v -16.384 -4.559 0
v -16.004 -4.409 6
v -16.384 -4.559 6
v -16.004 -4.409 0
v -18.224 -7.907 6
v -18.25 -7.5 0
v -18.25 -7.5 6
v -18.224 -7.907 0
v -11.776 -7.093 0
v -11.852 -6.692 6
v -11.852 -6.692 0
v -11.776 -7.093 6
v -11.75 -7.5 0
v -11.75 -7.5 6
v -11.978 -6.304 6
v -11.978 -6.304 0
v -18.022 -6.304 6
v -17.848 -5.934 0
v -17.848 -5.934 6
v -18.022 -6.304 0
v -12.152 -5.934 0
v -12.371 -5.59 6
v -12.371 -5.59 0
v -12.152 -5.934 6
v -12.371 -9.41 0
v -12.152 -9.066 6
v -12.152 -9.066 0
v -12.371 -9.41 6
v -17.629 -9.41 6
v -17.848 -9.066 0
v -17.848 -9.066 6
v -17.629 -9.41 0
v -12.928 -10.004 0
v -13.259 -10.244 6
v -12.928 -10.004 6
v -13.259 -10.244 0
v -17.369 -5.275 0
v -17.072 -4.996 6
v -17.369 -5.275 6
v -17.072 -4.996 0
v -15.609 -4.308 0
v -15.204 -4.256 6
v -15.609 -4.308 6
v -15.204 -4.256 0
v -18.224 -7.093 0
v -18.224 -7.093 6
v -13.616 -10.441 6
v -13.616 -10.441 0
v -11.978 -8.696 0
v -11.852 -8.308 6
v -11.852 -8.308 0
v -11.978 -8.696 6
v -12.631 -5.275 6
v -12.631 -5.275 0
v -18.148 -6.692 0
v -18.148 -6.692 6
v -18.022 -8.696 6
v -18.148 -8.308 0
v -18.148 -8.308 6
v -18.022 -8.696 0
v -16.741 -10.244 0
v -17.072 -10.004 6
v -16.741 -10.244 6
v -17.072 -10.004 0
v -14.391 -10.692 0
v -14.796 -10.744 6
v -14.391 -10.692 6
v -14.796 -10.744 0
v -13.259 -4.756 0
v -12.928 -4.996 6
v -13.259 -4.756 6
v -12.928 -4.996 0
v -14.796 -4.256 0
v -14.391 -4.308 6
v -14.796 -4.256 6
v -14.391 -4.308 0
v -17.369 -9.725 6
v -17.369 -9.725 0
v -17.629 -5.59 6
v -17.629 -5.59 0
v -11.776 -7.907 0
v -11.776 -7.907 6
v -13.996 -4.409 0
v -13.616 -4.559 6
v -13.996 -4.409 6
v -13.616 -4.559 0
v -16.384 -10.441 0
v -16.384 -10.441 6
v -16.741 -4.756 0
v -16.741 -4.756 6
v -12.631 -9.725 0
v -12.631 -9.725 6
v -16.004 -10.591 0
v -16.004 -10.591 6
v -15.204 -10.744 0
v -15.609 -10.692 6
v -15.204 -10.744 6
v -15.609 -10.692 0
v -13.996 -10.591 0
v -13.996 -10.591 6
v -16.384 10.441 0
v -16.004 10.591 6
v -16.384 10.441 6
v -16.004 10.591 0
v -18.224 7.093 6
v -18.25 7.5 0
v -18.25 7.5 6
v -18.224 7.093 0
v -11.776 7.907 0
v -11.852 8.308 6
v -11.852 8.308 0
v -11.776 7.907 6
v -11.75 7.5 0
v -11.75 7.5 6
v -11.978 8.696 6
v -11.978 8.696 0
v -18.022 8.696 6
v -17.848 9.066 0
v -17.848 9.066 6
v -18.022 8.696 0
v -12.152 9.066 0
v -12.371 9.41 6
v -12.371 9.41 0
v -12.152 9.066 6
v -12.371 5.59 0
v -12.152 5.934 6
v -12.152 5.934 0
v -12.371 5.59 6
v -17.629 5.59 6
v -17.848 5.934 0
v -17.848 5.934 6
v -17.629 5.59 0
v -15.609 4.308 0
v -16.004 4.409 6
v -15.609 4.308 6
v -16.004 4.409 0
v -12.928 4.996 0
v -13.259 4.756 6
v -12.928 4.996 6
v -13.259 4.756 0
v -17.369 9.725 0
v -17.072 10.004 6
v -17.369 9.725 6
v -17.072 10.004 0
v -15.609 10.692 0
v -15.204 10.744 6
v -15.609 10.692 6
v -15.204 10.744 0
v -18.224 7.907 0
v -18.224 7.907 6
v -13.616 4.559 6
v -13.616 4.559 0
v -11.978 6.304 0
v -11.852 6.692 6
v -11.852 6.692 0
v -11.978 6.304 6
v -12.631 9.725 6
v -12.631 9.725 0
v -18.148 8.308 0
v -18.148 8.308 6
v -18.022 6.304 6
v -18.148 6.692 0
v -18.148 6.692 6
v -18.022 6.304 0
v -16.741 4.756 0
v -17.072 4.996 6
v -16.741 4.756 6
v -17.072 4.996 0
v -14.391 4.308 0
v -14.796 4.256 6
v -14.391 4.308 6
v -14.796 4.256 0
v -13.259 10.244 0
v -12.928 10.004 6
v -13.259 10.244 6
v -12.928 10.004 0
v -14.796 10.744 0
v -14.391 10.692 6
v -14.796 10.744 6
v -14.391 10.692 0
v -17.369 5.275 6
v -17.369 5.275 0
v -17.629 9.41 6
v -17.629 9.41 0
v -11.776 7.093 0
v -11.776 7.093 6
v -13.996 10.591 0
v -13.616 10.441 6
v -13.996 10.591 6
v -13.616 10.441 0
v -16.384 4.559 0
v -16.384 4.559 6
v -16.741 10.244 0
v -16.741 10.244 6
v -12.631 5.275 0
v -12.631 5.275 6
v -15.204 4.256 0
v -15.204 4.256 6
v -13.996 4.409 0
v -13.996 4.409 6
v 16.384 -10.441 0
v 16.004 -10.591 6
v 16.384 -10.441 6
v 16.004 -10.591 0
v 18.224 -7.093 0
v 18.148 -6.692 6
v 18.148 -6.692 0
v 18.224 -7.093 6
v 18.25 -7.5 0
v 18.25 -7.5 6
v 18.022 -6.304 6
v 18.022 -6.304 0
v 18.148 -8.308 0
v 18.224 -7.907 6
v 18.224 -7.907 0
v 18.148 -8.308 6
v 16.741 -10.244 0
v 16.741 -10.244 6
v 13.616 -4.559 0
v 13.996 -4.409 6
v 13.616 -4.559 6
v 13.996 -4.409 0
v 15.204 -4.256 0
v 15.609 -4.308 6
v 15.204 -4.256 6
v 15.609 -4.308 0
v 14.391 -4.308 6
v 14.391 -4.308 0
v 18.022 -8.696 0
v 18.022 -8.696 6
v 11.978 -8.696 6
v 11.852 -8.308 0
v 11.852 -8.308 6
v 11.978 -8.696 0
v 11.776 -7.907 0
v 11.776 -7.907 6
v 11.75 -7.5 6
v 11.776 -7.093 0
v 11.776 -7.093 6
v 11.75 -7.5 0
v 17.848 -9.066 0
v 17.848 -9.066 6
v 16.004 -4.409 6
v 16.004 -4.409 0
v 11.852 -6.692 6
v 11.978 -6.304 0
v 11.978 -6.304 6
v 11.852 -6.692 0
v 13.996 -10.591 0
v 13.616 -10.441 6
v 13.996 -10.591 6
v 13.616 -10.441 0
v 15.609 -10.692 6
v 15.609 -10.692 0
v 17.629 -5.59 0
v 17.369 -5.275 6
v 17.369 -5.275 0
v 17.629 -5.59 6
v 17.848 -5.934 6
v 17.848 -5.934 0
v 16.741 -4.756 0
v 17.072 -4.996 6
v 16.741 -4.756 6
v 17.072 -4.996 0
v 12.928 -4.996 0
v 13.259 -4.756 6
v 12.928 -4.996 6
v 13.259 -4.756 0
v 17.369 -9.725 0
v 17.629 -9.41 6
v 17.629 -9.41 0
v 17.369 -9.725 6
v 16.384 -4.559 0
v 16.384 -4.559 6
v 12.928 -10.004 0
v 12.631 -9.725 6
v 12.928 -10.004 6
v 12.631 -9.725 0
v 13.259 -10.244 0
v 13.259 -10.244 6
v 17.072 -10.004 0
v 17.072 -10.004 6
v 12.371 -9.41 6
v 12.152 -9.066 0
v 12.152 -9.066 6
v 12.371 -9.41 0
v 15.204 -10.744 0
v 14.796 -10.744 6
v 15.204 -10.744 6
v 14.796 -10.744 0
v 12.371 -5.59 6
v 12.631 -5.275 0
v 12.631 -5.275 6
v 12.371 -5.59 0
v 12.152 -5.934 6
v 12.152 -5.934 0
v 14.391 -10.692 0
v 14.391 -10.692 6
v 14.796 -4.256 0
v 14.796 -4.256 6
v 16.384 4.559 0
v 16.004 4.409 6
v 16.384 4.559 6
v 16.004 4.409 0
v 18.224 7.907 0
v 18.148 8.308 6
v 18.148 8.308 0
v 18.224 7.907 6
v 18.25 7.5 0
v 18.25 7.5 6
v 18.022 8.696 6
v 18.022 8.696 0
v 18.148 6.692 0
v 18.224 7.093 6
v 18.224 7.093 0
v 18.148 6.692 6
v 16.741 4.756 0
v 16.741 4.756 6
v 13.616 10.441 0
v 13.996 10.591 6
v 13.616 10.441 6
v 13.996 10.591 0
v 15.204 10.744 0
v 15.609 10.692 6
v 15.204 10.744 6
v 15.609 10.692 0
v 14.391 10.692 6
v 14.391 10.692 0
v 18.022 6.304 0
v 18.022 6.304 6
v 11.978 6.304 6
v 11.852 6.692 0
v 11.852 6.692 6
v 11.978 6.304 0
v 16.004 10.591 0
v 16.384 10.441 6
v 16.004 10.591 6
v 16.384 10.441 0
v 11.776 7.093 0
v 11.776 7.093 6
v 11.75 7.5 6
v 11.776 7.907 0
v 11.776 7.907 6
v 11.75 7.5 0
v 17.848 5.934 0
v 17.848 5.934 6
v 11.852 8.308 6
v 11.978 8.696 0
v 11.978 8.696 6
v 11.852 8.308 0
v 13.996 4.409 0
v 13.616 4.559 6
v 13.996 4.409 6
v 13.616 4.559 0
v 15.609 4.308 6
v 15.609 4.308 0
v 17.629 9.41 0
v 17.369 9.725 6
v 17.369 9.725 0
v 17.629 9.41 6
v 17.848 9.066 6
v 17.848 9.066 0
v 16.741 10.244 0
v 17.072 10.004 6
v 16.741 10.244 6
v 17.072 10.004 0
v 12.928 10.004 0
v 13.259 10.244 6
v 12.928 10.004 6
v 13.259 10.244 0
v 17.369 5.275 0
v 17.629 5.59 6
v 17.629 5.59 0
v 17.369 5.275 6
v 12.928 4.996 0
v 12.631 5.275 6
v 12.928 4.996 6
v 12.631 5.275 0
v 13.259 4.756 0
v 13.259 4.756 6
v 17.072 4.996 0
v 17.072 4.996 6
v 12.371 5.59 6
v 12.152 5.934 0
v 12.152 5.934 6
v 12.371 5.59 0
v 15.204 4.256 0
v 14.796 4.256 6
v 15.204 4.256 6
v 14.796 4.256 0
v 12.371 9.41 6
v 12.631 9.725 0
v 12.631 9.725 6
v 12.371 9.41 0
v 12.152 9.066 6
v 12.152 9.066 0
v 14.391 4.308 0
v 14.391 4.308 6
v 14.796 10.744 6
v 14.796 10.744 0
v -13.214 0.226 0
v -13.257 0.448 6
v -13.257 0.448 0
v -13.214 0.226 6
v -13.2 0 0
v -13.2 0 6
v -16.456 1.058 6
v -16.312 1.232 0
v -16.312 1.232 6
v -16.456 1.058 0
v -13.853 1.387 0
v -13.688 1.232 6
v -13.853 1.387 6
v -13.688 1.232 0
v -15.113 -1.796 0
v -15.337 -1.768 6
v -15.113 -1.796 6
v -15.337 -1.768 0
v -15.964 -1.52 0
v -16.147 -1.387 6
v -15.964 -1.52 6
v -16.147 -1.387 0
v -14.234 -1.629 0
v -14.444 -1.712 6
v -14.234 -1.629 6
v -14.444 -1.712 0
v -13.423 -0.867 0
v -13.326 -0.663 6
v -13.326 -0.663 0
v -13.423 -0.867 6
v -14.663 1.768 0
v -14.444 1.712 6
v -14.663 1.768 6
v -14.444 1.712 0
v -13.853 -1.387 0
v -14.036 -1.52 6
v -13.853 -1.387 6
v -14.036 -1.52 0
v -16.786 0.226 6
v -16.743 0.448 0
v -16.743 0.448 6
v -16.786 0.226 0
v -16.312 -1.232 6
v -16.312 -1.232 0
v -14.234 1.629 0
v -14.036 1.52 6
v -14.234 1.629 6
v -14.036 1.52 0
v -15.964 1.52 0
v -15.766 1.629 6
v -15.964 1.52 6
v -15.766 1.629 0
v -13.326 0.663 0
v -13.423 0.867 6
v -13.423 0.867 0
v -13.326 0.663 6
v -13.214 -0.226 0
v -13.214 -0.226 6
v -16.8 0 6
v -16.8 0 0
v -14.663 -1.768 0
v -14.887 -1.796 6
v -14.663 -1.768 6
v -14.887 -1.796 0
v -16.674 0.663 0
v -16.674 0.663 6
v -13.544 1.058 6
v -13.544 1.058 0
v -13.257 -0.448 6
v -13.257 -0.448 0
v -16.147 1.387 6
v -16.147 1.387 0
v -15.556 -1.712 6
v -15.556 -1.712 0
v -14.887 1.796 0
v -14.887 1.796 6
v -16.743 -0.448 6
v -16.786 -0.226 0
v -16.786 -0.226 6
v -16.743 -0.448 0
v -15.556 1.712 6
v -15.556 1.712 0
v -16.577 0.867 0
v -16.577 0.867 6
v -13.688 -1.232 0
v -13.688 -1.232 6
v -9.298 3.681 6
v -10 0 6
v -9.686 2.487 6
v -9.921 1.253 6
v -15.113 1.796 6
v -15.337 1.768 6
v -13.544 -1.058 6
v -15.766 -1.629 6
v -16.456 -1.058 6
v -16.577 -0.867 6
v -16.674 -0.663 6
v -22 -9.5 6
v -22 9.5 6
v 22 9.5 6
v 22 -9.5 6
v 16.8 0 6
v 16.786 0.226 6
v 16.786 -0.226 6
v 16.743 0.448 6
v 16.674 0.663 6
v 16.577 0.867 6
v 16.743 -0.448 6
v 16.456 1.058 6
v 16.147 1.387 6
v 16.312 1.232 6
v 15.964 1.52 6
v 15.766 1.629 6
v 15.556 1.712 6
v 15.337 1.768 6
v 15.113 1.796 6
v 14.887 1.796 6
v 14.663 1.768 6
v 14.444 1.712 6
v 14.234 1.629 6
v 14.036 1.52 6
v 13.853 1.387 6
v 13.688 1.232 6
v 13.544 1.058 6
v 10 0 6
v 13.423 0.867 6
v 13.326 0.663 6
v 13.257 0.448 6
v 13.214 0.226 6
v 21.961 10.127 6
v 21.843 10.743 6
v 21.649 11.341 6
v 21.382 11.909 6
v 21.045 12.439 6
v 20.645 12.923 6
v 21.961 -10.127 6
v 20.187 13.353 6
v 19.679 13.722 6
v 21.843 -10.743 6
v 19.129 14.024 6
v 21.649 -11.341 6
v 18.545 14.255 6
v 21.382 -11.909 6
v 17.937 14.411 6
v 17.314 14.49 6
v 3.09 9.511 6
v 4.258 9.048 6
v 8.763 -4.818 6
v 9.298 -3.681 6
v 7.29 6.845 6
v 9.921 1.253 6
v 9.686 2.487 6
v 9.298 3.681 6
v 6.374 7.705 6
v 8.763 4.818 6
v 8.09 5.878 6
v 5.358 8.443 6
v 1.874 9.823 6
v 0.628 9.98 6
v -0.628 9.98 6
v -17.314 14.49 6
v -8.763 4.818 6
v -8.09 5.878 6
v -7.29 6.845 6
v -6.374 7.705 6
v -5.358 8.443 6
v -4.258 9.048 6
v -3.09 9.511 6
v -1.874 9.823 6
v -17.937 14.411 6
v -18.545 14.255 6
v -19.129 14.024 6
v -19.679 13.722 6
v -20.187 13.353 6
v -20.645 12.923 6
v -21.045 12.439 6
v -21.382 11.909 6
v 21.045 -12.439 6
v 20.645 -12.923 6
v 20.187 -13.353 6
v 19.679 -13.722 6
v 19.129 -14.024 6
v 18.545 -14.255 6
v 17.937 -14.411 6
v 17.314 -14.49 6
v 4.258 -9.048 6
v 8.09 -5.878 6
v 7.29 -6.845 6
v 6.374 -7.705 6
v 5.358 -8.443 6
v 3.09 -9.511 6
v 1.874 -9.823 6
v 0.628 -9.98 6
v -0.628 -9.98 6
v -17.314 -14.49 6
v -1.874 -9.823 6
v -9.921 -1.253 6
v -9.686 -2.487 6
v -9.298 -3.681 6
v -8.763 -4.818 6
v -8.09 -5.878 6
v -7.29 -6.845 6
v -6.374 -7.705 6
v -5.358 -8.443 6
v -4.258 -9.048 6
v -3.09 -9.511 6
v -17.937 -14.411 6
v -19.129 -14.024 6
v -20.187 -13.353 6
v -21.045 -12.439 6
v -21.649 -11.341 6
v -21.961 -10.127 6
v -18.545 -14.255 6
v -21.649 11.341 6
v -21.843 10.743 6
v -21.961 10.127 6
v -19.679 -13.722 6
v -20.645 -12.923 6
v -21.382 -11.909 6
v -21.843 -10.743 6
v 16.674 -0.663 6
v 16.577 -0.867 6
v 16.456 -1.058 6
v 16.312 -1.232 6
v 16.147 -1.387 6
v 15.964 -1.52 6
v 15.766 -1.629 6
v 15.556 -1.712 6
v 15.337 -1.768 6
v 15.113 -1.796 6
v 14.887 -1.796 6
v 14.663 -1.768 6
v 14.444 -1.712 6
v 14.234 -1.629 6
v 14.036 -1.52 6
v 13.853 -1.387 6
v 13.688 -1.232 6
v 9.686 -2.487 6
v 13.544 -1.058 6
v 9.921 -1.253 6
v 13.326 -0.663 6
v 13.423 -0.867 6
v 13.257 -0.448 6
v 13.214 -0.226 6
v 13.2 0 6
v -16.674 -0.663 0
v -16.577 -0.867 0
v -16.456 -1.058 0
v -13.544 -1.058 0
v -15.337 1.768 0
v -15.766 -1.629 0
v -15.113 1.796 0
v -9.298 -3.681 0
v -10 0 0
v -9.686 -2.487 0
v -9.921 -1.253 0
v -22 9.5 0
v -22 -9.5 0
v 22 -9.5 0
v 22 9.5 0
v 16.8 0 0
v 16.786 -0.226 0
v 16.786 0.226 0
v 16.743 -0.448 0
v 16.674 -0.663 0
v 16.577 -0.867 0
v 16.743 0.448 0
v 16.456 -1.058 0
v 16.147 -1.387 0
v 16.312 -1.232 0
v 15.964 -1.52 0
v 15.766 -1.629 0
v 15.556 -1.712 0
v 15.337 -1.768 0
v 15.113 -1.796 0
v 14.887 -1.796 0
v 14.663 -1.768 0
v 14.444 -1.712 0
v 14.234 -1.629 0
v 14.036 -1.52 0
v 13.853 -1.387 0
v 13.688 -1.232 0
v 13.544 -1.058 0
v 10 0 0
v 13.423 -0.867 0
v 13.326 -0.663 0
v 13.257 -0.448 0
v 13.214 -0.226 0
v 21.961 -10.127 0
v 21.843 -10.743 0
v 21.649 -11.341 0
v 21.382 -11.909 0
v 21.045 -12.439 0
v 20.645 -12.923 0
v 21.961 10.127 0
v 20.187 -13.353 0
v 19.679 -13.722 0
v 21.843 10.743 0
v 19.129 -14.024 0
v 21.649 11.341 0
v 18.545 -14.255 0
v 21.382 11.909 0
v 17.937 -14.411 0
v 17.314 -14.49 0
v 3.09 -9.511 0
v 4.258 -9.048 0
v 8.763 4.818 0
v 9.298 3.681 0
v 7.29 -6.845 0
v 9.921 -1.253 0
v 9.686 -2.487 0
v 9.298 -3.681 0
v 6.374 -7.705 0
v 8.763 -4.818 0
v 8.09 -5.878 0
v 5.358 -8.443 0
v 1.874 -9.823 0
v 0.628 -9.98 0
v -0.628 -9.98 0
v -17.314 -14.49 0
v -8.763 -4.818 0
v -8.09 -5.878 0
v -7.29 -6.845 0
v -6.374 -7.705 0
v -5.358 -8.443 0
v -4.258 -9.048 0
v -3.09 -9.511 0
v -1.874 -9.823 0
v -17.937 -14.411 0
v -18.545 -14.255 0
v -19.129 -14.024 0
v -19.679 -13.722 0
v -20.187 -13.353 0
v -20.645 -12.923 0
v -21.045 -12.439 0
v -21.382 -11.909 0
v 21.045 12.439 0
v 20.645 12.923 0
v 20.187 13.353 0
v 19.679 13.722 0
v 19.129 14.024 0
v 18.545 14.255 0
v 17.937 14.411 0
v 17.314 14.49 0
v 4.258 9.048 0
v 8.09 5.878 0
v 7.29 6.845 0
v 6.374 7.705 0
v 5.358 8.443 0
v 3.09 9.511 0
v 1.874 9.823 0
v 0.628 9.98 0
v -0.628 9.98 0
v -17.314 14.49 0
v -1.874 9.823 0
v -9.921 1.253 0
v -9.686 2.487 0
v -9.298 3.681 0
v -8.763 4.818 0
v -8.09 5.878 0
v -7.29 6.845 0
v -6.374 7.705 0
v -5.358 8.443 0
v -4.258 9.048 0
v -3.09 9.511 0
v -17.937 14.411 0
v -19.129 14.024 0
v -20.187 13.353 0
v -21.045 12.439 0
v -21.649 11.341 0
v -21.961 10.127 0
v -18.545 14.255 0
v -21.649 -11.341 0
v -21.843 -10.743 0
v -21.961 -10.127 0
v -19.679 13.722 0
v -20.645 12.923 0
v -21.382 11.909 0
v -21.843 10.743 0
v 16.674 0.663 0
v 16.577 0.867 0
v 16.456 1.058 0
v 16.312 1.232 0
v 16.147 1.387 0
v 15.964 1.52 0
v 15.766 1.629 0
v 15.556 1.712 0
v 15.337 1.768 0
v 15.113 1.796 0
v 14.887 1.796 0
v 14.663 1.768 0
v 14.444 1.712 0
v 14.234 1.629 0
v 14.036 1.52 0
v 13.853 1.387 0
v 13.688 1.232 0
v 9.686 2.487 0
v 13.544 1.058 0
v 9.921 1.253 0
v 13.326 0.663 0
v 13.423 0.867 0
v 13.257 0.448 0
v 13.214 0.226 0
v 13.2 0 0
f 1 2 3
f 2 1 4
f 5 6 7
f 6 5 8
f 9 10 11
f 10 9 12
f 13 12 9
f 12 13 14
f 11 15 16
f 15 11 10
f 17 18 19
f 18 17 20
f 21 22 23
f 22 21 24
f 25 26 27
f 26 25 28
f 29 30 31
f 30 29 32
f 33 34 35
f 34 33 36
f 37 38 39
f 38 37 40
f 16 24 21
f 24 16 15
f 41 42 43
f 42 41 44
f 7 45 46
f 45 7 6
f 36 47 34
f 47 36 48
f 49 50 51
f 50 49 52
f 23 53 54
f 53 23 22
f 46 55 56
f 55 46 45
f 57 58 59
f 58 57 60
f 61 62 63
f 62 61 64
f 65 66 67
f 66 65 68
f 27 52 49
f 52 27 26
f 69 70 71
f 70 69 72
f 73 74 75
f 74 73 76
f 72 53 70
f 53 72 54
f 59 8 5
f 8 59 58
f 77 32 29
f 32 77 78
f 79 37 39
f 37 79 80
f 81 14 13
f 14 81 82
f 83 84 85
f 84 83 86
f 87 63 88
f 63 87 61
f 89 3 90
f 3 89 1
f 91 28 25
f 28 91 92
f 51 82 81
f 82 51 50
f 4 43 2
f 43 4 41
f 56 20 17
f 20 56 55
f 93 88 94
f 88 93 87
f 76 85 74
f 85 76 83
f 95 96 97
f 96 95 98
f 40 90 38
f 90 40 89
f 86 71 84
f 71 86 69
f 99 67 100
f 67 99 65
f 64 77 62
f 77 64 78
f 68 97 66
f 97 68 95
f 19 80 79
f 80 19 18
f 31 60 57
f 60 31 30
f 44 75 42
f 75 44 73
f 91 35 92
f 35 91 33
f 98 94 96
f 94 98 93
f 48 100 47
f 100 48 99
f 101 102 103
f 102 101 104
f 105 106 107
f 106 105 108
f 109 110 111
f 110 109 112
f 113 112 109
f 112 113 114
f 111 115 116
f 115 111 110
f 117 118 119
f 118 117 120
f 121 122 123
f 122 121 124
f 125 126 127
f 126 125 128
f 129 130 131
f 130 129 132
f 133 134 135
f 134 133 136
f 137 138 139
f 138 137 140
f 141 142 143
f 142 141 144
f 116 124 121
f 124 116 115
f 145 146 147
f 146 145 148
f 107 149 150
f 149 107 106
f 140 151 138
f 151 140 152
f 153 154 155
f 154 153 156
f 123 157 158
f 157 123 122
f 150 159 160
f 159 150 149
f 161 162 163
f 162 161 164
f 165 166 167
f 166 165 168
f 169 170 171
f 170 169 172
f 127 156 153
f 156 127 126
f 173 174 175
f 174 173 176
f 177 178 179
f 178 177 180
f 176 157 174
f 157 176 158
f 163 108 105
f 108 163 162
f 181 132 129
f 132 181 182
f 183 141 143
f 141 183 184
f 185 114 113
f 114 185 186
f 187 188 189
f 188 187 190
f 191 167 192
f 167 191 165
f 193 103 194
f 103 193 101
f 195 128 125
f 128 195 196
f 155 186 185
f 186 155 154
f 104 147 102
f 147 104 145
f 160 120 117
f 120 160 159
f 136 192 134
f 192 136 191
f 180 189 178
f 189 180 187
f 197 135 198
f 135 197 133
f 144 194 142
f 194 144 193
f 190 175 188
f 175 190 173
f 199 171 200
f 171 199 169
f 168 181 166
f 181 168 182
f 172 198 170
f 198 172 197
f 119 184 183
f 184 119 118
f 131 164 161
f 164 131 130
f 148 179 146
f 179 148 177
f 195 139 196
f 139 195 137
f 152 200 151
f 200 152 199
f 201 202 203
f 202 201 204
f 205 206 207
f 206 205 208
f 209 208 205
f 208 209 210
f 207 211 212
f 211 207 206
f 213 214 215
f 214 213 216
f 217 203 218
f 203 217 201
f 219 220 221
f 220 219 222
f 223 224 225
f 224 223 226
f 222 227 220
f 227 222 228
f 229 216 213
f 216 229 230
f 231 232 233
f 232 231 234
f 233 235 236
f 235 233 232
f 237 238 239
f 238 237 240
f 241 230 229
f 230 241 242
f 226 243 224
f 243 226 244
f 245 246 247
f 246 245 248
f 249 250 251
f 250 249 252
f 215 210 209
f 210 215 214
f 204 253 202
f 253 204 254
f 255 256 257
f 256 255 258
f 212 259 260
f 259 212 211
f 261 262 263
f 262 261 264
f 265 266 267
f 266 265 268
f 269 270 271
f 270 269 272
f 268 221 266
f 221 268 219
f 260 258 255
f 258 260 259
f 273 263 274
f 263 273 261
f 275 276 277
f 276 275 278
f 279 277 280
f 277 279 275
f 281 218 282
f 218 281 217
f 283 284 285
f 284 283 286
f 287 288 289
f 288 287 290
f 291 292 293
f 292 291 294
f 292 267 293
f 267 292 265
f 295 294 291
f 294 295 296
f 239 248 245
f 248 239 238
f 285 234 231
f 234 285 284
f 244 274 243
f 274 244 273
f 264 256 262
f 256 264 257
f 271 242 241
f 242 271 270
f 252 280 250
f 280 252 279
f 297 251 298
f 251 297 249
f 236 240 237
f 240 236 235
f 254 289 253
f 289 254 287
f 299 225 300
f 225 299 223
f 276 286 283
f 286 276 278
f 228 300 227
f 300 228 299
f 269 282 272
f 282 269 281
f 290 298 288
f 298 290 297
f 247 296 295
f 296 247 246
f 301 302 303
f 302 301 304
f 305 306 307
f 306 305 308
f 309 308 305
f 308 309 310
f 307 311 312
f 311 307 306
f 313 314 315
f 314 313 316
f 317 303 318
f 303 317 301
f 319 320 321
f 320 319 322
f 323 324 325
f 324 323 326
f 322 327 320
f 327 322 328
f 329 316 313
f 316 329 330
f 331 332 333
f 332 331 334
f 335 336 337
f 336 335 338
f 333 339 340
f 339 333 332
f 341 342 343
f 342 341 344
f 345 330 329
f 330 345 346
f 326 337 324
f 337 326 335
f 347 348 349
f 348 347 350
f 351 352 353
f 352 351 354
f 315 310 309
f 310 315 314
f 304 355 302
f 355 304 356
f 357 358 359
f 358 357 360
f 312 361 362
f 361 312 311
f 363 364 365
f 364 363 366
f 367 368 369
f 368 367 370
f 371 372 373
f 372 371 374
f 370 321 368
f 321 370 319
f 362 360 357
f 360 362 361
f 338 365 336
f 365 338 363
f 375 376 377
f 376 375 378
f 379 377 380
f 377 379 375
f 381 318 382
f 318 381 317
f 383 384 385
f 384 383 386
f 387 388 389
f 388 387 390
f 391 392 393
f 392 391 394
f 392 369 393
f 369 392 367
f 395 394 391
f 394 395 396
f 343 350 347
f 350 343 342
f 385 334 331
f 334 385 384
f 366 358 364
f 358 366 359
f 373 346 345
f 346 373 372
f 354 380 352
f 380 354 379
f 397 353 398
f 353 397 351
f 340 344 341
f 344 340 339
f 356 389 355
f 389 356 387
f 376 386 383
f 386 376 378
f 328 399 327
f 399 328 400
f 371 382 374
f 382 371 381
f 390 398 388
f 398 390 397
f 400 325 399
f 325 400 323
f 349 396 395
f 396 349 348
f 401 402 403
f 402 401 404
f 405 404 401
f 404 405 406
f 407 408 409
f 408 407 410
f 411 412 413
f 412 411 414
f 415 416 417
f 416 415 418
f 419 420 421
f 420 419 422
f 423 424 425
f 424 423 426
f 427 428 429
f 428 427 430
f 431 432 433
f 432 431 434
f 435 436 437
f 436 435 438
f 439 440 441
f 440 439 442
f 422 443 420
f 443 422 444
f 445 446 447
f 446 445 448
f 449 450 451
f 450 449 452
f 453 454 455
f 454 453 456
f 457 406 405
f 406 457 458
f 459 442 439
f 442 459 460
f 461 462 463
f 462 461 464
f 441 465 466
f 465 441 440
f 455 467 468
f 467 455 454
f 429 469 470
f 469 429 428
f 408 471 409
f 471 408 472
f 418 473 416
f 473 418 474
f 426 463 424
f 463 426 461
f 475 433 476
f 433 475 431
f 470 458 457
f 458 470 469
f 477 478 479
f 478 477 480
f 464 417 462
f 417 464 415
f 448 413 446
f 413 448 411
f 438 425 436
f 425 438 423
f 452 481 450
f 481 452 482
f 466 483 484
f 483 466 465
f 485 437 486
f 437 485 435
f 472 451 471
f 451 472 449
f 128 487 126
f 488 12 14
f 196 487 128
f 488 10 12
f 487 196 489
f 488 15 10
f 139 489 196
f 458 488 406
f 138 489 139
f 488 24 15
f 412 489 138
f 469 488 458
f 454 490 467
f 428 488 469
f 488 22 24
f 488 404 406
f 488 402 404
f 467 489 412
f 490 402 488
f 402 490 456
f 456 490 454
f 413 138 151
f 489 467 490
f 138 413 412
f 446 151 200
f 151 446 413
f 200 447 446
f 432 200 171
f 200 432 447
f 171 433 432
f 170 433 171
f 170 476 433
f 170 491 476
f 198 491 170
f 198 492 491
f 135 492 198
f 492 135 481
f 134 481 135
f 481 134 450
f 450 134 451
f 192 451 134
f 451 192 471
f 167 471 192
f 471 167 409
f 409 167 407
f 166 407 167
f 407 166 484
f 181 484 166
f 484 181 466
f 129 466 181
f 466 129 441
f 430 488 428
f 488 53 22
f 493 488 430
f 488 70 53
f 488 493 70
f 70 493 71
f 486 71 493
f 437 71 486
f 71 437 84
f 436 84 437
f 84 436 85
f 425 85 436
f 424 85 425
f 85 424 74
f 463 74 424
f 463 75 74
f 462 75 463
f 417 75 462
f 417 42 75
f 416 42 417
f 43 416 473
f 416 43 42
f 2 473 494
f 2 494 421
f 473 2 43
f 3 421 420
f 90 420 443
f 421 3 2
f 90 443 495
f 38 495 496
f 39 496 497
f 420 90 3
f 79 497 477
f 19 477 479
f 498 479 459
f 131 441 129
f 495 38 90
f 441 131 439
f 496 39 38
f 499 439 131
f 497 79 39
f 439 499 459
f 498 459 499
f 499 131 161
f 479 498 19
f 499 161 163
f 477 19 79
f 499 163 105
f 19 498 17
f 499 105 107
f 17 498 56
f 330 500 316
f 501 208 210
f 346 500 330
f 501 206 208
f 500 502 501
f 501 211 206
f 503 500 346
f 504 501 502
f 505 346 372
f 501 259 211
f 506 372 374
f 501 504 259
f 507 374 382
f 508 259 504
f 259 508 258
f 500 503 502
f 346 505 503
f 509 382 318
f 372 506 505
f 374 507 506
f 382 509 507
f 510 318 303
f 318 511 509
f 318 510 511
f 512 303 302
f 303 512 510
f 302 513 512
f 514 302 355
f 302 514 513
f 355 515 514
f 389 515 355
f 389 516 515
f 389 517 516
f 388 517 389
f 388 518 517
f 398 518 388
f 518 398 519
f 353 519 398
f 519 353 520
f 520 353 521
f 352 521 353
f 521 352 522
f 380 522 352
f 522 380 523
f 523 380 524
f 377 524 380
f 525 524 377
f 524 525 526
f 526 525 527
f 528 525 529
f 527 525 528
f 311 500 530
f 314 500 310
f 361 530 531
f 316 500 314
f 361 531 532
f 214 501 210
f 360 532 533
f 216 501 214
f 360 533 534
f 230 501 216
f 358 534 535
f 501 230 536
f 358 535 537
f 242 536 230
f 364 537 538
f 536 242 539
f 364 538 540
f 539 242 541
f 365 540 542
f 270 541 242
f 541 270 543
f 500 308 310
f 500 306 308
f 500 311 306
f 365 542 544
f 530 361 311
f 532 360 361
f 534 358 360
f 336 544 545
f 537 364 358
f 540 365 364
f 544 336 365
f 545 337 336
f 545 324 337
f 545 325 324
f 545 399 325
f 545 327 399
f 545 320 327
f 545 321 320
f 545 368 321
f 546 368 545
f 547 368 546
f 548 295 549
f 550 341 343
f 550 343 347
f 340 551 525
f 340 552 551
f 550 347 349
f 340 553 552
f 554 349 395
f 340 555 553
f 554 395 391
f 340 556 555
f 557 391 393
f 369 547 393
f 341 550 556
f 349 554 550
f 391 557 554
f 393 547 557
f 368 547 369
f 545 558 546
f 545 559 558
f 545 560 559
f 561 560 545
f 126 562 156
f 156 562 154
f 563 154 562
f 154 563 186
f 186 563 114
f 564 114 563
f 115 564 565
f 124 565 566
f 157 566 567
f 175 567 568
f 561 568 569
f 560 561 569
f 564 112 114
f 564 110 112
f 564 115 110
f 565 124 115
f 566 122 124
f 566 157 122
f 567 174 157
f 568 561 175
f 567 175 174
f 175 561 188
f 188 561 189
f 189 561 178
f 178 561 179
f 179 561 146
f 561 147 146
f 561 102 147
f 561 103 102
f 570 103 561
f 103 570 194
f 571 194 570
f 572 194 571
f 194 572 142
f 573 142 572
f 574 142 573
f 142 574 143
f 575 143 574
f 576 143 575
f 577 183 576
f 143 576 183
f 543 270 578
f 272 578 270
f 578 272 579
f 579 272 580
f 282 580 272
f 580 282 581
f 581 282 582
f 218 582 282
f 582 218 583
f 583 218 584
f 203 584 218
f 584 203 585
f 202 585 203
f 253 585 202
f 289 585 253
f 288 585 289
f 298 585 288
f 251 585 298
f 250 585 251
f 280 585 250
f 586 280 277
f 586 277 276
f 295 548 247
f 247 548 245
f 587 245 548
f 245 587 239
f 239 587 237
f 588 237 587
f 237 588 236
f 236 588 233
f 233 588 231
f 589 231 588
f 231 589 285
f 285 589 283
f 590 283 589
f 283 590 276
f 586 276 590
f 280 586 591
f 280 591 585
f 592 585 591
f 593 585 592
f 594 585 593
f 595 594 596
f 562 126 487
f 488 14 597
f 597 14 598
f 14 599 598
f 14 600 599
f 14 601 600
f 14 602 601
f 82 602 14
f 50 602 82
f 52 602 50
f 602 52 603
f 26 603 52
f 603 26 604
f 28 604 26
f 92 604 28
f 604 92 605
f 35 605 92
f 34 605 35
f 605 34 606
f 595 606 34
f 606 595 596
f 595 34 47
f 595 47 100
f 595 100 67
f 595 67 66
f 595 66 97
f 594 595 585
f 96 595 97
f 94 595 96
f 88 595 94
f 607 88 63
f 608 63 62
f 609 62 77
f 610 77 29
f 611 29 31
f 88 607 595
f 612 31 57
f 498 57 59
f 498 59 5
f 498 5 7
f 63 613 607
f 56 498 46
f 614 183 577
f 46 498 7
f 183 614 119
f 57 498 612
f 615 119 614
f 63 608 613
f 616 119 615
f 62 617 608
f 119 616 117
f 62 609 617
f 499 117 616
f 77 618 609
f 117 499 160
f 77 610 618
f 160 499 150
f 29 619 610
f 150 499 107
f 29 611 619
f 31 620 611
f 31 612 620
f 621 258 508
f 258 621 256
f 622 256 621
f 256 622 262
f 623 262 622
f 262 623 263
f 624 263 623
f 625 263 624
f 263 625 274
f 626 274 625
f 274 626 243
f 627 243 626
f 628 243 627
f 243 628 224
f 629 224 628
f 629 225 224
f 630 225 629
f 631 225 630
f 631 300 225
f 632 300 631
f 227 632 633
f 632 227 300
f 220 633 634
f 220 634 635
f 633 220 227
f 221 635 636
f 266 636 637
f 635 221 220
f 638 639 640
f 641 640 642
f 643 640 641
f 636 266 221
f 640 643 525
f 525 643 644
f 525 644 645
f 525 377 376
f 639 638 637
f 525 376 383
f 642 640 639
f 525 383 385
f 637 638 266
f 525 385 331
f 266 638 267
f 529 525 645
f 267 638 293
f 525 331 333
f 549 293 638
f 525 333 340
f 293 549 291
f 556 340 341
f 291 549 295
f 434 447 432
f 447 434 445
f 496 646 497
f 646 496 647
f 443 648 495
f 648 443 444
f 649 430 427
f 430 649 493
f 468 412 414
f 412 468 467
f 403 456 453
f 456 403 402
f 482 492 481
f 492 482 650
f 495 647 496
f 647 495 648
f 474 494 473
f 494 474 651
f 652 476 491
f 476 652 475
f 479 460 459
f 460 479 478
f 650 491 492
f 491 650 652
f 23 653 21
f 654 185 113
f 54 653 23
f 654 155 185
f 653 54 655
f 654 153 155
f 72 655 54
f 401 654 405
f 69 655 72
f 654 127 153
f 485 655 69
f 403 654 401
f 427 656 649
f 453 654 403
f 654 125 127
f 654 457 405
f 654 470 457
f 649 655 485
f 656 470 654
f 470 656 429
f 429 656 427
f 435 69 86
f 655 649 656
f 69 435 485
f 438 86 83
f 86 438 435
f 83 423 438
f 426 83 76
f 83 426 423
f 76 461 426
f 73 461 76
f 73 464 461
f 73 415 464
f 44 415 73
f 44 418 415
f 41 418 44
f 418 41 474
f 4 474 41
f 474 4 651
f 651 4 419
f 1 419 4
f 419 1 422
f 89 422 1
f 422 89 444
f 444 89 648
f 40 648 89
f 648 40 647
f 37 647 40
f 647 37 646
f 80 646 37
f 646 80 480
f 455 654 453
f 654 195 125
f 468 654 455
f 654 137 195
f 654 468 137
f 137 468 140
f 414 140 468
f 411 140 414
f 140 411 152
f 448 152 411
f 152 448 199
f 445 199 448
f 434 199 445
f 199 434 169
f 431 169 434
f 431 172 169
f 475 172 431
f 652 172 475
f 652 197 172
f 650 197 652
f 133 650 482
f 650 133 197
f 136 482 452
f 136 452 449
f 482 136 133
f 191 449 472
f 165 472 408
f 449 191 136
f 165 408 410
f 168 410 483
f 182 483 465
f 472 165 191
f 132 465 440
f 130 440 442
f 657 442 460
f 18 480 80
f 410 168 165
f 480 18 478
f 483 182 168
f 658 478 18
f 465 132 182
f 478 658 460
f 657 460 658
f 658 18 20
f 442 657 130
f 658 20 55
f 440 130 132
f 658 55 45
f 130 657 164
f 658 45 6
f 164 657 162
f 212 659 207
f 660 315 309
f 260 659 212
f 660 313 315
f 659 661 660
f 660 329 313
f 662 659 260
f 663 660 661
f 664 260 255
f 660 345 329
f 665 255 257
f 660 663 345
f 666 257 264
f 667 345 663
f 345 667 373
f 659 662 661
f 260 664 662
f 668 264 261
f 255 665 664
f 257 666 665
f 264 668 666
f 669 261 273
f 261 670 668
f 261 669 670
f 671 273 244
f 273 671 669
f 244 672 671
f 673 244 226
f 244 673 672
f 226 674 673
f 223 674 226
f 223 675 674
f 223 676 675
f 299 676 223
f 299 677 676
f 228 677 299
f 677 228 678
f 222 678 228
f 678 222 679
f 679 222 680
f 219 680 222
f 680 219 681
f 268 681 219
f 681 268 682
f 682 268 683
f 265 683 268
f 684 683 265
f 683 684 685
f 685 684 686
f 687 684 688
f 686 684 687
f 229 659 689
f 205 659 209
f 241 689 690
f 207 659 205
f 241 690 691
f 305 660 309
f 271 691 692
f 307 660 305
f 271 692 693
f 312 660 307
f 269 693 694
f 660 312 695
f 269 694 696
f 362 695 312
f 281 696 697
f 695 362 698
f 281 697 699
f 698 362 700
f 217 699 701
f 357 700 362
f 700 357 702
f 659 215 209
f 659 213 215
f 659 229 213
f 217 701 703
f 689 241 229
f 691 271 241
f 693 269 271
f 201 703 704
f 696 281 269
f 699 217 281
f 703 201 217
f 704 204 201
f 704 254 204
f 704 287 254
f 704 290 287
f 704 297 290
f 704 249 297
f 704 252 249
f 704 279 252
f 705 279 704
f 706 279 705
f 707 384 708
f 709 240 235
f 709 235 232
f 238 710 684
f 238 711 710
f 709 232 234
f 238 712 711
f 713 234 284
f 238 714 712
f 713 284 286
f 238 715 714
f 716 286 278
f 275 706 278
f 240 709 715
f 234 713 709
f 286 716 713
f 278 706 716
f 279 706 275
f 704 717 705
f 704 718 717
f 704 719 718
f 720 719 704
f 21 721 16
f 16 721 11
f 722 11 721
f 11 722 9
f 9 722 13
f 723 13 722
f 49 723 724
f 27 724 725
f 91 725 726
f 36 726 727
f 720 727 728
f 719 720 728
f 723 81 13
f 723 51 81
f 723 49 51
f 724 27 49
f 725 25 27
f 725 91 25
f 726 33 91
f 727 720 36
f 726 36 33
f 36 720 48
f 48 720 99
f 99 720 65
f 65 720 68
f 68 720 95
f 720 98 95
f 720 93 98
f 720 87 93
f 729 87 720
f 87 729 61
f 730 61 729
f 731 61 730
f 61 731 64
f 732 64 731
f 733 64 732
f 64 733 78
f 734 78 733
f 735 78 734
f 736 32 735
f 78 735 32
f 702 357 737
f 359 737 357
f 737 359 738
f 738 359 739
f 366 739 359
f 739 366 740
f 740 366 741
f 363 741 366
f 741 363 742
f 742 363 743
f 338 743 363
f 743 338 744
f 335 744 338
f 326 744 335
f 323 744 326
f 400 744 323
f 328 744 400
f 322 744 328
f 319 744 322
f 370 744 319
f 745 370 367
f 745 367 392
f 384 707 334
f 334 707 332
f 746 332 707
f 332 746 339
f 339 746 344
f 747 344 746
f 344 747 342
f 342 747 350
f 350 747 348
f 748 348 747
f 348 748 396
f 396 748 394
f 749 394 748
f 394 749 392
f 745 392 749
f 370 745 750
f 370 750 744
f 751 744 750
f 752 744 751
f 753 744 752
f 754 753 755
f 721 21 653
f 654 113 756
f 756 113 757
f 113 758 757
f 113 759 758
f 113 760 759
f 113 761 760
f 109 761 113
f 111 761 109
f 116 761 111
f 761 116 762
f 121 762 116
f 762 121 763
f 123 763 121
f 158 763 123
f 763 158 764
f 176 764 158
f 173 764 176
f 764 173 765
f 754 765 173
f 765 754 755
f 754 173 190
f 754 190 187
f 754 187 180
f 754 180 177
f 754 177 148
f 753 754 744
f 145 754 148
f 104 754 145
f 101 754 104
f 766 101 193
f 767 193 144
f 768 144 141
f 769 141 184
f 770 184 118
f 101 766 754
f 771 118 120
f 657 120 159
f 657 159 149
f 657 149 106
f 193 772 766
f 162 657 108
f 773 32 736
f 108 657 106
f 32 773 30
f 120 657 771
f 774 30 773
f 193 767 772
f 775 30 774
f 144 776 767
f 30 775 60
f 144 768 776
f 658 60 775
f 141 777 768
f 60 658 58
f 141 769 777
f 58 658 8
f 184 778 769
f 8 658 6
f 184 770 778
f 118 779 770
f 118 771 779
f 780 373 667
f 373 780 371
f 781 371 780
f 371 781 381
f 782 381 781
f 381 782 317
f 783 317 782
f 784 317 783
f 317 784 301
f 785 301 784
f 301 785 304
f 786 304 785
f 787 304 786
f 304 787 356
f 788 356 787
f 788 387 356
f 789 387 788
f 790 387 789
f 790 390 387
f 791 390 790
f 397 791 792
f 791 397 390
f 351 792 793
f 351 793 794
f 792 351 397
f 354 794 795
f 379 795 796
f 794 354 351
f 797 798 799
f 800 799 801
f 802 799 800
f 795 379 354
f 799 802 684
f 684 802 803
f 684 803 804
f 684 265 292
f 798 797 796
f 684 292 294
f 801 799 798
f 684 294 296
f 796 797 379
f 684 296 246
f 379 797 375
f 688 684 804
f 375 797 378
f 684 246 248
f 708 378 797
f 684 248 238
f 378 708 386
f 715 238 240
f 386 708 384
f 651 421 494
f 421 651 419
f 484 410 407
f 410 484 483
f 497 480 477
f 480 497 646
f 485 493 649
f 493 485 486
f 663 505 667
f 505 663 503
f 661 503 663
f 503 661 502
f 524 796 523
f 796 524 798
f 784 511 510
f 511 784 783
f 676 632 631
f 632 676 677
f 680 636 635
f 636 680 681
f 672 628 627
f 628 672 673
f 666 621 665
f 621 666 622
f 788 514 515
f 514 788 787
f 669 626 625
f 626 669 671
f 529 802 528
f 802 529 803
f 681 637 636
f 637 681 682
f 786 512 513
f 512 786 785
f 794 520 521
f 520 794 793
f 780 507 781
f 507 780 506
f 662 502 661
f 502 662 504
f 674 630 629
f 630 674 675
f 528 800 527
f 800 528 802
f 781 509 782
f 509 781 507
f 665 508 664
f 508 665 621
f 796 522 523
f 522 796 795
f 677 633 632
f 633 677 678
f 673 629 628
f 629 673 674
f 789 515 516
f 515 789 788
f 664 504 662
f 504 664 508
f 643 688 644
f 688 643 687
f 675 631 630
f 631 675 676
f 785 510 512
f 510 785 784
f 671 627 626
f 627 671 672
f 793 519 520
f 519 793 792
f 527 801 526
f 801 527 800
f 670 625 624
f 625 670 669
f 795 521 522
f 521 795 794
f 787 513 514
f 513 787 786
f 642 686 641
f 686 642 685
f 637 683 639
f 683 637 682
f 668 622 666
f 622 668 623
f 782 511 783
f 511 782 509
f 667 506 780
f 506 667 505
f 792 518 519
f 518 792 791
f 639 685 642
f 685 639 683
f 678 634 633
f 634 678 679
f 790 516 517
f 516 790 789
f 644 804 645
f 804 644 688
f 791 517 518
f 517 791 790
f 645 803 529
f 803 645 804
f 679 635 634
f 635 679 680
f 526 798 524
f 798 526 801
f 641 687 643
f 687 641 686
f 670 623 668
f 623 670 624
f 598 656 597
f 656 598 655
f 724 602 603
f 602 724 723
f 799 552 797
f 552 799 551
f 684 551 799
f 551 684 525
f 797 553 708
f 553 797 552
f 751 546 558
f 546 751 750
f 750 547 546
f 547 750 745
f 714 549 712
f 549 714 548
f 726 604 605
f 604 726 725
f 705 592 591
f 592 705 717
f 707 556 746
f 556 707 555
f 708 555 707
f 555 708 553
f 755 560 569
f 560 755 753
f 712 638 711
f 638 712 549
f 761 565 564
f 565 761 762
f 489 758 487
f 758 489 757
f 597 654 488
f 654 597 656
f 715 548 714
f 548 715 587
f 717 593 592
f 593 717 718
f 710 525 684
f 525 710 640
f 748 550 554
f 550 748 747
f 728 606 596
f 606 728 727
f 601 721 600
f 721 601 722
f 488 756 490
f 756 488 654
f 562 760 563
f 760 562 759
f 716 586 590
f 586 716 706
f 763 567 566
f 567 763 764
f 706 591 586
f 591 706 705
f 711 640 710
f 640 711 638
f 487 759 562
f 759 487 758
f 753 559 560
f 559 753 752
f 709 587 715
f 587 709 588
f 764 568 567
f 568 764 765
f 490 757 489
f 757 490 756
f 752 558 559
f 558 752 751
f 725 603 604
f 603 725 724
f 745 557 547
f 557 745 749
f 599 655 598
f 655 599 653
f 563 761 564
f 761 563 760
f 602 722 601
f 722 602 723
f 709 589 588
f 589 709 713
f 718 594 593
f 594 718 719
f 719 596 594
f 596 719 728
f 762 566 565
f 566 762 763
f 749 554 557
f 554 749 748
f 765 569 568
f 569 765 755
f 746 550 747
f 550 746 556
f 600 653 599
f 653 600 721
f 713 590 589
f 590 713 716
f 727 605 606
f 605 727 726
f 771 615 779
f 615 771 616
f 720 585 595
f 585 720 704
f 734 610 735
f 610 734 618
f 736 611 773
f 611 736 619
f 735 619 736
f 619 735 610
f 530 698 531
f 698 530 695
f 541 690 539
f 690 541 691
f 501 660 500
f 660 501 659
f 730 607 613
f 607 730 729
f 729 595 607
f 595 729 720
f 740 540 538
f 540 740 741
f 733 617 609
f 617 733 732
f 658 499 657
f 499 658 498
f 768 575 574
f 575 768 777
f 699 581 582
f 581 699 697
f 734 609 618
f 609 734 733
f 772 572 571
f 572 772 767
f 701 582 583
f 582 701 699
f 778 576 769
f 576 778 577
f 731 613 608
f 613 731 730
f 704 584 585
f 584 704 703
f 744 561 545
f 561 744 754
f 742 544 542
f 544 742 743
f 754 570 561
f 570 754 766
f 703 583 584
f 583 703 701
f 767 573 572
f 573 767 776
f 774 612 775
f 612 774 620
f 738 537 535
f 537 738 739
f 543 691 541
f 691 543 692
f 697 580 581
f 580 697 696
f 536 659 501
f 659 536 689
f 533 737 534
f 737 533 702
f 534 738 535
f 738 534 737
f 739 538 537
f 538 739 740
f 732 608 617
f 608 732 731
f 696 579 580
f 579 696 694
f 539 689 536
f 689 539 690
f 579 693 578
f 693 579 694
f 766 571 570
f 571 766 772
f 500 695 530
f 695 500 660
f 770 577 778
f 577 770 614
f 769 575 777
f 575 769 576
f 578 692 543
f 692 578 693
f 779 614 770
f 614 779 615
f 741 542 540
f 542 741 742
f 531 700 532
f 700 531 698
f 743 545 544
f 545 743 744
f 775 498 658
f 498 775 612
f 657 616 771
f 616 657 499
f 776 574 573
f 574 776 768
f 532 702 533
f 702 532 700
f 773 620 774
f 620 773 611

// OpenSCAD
$fn = 50;


difference() {
	union() {
		hull() {
			translate(v = [-17.0000000000, 9.5000000000, 0]) {
				cylinder(h = 6, r = 5);
			}
			translate(v = [17.0000000000, 9.5000000000, 0]) {
				cylinder(h = 6, r = 5);
			}
			translate(v = [-17.0000000000, -9.5000000000, 0]) {
				cylinder(h = 6, r = 5);
			}
			translate(v = [17.0000000000, -9.5000000000, 0]) {
				cylinder(h = 6, r = 5);
			}
		}
	}
	union() {
		#translate(v = [-15.0000000000, -7.5000000000, 0]) {
			cylinder(h = 6, r = 3.2500000000);
		}
		#translate(v = [-15.0000000000, 7.5000000000, 0]) {
			cylinder(h = 6, r = 3.2500000000);
		}
		#translate(v = [15.0000000000, -7.5000000000, 0]) {
			cylinder(h = 6, r = 3.2500000000);
		}
		#translate(v = [15.0000000000, 7.5000000000, 0]) {
			cylinder(h = 6, r = 3.2500000000);
		}
		#translate(v = [-15.0000000000, -7.5000000000, -100.0000000000]) {
			cylinder(h = 200, r = 3.2500000000);
		}
		#translate(v = [-15.0000000000, 7.5000000000, -100.0000000000]) {
			cylinder(h = 200, r = 3.2500000000);
		}
		#translate(v = [15.0000000000, -7.5000000000, -100.0000000000]) {
			cylinder(h = 200, r = 3.2500000000);
		}
		#translate(v = [15.0000000000, 7.5000000000, -100.0000000000]) {
			cylinder(h = 200, r = 3.2500000000);
		}
		#translate(v = [-15.0000000000, -7.5000000000, 0]) {
			cylinder(h = 6, r = 1.8000000000);
		}
		#translate(v = [-15.0000000000, 0.0000000000, 0]) {
			cylinder(h = 6, r = 1.8000000000);
		}
		#translate(v = [-15.0000000000, 7.5000000000, 0]) {
			cylinder(h = 6, r = 1.8000000000);
		}
		#translate(v = [15.0000000000, -7.5000000000, 0]) {
			cylinder(h = 6, r = 1.8000000000);
		}
		#translate(v = [15.0000000000, 0.0000000000, 0]) {
			cylinder(h = 6, r = 1.8000000000);
		}
		#translate(v = [15.0000000000, 7.5000000000, 0]) {
			cylinder(h = 6, r = 1.8000000000);
		}
		#translate(v = [-15.0000000000, -7.5000000000, 0]) {
			cylinder(h = 6, r = 1.8000000000);
		}
		#translate(v = [-15.0000000000, 0.0000000000, 0]) {
			cylinder(h = 6, r = 1.8000000000);
		}
		#translate(v = [-15.0000000000, 7.5000000000, 0]) {
			cylinder(h = 6, r = 1.8000000000);
		}
		#translate(v = [15.0000000000, -7.5000000000, 0]) {
			cylinder(h = 6, r = 1.8000000000);
		}
		#translate(v = [15.0000000000, 0.0000000000, 0]) {
			cylinder(h = 6, r = 1.8000000000);
		}
		#translate(v = [15.0000000000, 7.5000000000, 0]) {
			cylinder(h = 6, r = 1.8000000000);
		}
		#translate(v = [-15.0000000000, -7.5000000000, 0]) {
			cylinder(h = 6, r = 1.8000000000);
		}
		#translate(v = [-15.0000000000, 0.0000000000, 0]) {
			cylinder(h = 6, r = 1.8000000000);
		}
		#translate(v = [-15.0000000000, 7.5000000000, 0]) {
			cylinder(h = 6, r = 1.8000000000);
		}
		#translate(v = [15.0000000000, -7.5000000000, 0]) {
			cylinder(h = 6, r = 1.8000000000);
		}
		#translate(v = [15.0000000000, 0.0000000000, 0]) {
			cylinder(h = 6, r = 1.8000000000);
		}
		#translate(v = [15.0000000000, 7.5000000000, 0]) {
			cylinder(h = 6, r = 1.8000000000);
		}
		#cylinder(h = 6, r = 10.0000000000);
	}
}
